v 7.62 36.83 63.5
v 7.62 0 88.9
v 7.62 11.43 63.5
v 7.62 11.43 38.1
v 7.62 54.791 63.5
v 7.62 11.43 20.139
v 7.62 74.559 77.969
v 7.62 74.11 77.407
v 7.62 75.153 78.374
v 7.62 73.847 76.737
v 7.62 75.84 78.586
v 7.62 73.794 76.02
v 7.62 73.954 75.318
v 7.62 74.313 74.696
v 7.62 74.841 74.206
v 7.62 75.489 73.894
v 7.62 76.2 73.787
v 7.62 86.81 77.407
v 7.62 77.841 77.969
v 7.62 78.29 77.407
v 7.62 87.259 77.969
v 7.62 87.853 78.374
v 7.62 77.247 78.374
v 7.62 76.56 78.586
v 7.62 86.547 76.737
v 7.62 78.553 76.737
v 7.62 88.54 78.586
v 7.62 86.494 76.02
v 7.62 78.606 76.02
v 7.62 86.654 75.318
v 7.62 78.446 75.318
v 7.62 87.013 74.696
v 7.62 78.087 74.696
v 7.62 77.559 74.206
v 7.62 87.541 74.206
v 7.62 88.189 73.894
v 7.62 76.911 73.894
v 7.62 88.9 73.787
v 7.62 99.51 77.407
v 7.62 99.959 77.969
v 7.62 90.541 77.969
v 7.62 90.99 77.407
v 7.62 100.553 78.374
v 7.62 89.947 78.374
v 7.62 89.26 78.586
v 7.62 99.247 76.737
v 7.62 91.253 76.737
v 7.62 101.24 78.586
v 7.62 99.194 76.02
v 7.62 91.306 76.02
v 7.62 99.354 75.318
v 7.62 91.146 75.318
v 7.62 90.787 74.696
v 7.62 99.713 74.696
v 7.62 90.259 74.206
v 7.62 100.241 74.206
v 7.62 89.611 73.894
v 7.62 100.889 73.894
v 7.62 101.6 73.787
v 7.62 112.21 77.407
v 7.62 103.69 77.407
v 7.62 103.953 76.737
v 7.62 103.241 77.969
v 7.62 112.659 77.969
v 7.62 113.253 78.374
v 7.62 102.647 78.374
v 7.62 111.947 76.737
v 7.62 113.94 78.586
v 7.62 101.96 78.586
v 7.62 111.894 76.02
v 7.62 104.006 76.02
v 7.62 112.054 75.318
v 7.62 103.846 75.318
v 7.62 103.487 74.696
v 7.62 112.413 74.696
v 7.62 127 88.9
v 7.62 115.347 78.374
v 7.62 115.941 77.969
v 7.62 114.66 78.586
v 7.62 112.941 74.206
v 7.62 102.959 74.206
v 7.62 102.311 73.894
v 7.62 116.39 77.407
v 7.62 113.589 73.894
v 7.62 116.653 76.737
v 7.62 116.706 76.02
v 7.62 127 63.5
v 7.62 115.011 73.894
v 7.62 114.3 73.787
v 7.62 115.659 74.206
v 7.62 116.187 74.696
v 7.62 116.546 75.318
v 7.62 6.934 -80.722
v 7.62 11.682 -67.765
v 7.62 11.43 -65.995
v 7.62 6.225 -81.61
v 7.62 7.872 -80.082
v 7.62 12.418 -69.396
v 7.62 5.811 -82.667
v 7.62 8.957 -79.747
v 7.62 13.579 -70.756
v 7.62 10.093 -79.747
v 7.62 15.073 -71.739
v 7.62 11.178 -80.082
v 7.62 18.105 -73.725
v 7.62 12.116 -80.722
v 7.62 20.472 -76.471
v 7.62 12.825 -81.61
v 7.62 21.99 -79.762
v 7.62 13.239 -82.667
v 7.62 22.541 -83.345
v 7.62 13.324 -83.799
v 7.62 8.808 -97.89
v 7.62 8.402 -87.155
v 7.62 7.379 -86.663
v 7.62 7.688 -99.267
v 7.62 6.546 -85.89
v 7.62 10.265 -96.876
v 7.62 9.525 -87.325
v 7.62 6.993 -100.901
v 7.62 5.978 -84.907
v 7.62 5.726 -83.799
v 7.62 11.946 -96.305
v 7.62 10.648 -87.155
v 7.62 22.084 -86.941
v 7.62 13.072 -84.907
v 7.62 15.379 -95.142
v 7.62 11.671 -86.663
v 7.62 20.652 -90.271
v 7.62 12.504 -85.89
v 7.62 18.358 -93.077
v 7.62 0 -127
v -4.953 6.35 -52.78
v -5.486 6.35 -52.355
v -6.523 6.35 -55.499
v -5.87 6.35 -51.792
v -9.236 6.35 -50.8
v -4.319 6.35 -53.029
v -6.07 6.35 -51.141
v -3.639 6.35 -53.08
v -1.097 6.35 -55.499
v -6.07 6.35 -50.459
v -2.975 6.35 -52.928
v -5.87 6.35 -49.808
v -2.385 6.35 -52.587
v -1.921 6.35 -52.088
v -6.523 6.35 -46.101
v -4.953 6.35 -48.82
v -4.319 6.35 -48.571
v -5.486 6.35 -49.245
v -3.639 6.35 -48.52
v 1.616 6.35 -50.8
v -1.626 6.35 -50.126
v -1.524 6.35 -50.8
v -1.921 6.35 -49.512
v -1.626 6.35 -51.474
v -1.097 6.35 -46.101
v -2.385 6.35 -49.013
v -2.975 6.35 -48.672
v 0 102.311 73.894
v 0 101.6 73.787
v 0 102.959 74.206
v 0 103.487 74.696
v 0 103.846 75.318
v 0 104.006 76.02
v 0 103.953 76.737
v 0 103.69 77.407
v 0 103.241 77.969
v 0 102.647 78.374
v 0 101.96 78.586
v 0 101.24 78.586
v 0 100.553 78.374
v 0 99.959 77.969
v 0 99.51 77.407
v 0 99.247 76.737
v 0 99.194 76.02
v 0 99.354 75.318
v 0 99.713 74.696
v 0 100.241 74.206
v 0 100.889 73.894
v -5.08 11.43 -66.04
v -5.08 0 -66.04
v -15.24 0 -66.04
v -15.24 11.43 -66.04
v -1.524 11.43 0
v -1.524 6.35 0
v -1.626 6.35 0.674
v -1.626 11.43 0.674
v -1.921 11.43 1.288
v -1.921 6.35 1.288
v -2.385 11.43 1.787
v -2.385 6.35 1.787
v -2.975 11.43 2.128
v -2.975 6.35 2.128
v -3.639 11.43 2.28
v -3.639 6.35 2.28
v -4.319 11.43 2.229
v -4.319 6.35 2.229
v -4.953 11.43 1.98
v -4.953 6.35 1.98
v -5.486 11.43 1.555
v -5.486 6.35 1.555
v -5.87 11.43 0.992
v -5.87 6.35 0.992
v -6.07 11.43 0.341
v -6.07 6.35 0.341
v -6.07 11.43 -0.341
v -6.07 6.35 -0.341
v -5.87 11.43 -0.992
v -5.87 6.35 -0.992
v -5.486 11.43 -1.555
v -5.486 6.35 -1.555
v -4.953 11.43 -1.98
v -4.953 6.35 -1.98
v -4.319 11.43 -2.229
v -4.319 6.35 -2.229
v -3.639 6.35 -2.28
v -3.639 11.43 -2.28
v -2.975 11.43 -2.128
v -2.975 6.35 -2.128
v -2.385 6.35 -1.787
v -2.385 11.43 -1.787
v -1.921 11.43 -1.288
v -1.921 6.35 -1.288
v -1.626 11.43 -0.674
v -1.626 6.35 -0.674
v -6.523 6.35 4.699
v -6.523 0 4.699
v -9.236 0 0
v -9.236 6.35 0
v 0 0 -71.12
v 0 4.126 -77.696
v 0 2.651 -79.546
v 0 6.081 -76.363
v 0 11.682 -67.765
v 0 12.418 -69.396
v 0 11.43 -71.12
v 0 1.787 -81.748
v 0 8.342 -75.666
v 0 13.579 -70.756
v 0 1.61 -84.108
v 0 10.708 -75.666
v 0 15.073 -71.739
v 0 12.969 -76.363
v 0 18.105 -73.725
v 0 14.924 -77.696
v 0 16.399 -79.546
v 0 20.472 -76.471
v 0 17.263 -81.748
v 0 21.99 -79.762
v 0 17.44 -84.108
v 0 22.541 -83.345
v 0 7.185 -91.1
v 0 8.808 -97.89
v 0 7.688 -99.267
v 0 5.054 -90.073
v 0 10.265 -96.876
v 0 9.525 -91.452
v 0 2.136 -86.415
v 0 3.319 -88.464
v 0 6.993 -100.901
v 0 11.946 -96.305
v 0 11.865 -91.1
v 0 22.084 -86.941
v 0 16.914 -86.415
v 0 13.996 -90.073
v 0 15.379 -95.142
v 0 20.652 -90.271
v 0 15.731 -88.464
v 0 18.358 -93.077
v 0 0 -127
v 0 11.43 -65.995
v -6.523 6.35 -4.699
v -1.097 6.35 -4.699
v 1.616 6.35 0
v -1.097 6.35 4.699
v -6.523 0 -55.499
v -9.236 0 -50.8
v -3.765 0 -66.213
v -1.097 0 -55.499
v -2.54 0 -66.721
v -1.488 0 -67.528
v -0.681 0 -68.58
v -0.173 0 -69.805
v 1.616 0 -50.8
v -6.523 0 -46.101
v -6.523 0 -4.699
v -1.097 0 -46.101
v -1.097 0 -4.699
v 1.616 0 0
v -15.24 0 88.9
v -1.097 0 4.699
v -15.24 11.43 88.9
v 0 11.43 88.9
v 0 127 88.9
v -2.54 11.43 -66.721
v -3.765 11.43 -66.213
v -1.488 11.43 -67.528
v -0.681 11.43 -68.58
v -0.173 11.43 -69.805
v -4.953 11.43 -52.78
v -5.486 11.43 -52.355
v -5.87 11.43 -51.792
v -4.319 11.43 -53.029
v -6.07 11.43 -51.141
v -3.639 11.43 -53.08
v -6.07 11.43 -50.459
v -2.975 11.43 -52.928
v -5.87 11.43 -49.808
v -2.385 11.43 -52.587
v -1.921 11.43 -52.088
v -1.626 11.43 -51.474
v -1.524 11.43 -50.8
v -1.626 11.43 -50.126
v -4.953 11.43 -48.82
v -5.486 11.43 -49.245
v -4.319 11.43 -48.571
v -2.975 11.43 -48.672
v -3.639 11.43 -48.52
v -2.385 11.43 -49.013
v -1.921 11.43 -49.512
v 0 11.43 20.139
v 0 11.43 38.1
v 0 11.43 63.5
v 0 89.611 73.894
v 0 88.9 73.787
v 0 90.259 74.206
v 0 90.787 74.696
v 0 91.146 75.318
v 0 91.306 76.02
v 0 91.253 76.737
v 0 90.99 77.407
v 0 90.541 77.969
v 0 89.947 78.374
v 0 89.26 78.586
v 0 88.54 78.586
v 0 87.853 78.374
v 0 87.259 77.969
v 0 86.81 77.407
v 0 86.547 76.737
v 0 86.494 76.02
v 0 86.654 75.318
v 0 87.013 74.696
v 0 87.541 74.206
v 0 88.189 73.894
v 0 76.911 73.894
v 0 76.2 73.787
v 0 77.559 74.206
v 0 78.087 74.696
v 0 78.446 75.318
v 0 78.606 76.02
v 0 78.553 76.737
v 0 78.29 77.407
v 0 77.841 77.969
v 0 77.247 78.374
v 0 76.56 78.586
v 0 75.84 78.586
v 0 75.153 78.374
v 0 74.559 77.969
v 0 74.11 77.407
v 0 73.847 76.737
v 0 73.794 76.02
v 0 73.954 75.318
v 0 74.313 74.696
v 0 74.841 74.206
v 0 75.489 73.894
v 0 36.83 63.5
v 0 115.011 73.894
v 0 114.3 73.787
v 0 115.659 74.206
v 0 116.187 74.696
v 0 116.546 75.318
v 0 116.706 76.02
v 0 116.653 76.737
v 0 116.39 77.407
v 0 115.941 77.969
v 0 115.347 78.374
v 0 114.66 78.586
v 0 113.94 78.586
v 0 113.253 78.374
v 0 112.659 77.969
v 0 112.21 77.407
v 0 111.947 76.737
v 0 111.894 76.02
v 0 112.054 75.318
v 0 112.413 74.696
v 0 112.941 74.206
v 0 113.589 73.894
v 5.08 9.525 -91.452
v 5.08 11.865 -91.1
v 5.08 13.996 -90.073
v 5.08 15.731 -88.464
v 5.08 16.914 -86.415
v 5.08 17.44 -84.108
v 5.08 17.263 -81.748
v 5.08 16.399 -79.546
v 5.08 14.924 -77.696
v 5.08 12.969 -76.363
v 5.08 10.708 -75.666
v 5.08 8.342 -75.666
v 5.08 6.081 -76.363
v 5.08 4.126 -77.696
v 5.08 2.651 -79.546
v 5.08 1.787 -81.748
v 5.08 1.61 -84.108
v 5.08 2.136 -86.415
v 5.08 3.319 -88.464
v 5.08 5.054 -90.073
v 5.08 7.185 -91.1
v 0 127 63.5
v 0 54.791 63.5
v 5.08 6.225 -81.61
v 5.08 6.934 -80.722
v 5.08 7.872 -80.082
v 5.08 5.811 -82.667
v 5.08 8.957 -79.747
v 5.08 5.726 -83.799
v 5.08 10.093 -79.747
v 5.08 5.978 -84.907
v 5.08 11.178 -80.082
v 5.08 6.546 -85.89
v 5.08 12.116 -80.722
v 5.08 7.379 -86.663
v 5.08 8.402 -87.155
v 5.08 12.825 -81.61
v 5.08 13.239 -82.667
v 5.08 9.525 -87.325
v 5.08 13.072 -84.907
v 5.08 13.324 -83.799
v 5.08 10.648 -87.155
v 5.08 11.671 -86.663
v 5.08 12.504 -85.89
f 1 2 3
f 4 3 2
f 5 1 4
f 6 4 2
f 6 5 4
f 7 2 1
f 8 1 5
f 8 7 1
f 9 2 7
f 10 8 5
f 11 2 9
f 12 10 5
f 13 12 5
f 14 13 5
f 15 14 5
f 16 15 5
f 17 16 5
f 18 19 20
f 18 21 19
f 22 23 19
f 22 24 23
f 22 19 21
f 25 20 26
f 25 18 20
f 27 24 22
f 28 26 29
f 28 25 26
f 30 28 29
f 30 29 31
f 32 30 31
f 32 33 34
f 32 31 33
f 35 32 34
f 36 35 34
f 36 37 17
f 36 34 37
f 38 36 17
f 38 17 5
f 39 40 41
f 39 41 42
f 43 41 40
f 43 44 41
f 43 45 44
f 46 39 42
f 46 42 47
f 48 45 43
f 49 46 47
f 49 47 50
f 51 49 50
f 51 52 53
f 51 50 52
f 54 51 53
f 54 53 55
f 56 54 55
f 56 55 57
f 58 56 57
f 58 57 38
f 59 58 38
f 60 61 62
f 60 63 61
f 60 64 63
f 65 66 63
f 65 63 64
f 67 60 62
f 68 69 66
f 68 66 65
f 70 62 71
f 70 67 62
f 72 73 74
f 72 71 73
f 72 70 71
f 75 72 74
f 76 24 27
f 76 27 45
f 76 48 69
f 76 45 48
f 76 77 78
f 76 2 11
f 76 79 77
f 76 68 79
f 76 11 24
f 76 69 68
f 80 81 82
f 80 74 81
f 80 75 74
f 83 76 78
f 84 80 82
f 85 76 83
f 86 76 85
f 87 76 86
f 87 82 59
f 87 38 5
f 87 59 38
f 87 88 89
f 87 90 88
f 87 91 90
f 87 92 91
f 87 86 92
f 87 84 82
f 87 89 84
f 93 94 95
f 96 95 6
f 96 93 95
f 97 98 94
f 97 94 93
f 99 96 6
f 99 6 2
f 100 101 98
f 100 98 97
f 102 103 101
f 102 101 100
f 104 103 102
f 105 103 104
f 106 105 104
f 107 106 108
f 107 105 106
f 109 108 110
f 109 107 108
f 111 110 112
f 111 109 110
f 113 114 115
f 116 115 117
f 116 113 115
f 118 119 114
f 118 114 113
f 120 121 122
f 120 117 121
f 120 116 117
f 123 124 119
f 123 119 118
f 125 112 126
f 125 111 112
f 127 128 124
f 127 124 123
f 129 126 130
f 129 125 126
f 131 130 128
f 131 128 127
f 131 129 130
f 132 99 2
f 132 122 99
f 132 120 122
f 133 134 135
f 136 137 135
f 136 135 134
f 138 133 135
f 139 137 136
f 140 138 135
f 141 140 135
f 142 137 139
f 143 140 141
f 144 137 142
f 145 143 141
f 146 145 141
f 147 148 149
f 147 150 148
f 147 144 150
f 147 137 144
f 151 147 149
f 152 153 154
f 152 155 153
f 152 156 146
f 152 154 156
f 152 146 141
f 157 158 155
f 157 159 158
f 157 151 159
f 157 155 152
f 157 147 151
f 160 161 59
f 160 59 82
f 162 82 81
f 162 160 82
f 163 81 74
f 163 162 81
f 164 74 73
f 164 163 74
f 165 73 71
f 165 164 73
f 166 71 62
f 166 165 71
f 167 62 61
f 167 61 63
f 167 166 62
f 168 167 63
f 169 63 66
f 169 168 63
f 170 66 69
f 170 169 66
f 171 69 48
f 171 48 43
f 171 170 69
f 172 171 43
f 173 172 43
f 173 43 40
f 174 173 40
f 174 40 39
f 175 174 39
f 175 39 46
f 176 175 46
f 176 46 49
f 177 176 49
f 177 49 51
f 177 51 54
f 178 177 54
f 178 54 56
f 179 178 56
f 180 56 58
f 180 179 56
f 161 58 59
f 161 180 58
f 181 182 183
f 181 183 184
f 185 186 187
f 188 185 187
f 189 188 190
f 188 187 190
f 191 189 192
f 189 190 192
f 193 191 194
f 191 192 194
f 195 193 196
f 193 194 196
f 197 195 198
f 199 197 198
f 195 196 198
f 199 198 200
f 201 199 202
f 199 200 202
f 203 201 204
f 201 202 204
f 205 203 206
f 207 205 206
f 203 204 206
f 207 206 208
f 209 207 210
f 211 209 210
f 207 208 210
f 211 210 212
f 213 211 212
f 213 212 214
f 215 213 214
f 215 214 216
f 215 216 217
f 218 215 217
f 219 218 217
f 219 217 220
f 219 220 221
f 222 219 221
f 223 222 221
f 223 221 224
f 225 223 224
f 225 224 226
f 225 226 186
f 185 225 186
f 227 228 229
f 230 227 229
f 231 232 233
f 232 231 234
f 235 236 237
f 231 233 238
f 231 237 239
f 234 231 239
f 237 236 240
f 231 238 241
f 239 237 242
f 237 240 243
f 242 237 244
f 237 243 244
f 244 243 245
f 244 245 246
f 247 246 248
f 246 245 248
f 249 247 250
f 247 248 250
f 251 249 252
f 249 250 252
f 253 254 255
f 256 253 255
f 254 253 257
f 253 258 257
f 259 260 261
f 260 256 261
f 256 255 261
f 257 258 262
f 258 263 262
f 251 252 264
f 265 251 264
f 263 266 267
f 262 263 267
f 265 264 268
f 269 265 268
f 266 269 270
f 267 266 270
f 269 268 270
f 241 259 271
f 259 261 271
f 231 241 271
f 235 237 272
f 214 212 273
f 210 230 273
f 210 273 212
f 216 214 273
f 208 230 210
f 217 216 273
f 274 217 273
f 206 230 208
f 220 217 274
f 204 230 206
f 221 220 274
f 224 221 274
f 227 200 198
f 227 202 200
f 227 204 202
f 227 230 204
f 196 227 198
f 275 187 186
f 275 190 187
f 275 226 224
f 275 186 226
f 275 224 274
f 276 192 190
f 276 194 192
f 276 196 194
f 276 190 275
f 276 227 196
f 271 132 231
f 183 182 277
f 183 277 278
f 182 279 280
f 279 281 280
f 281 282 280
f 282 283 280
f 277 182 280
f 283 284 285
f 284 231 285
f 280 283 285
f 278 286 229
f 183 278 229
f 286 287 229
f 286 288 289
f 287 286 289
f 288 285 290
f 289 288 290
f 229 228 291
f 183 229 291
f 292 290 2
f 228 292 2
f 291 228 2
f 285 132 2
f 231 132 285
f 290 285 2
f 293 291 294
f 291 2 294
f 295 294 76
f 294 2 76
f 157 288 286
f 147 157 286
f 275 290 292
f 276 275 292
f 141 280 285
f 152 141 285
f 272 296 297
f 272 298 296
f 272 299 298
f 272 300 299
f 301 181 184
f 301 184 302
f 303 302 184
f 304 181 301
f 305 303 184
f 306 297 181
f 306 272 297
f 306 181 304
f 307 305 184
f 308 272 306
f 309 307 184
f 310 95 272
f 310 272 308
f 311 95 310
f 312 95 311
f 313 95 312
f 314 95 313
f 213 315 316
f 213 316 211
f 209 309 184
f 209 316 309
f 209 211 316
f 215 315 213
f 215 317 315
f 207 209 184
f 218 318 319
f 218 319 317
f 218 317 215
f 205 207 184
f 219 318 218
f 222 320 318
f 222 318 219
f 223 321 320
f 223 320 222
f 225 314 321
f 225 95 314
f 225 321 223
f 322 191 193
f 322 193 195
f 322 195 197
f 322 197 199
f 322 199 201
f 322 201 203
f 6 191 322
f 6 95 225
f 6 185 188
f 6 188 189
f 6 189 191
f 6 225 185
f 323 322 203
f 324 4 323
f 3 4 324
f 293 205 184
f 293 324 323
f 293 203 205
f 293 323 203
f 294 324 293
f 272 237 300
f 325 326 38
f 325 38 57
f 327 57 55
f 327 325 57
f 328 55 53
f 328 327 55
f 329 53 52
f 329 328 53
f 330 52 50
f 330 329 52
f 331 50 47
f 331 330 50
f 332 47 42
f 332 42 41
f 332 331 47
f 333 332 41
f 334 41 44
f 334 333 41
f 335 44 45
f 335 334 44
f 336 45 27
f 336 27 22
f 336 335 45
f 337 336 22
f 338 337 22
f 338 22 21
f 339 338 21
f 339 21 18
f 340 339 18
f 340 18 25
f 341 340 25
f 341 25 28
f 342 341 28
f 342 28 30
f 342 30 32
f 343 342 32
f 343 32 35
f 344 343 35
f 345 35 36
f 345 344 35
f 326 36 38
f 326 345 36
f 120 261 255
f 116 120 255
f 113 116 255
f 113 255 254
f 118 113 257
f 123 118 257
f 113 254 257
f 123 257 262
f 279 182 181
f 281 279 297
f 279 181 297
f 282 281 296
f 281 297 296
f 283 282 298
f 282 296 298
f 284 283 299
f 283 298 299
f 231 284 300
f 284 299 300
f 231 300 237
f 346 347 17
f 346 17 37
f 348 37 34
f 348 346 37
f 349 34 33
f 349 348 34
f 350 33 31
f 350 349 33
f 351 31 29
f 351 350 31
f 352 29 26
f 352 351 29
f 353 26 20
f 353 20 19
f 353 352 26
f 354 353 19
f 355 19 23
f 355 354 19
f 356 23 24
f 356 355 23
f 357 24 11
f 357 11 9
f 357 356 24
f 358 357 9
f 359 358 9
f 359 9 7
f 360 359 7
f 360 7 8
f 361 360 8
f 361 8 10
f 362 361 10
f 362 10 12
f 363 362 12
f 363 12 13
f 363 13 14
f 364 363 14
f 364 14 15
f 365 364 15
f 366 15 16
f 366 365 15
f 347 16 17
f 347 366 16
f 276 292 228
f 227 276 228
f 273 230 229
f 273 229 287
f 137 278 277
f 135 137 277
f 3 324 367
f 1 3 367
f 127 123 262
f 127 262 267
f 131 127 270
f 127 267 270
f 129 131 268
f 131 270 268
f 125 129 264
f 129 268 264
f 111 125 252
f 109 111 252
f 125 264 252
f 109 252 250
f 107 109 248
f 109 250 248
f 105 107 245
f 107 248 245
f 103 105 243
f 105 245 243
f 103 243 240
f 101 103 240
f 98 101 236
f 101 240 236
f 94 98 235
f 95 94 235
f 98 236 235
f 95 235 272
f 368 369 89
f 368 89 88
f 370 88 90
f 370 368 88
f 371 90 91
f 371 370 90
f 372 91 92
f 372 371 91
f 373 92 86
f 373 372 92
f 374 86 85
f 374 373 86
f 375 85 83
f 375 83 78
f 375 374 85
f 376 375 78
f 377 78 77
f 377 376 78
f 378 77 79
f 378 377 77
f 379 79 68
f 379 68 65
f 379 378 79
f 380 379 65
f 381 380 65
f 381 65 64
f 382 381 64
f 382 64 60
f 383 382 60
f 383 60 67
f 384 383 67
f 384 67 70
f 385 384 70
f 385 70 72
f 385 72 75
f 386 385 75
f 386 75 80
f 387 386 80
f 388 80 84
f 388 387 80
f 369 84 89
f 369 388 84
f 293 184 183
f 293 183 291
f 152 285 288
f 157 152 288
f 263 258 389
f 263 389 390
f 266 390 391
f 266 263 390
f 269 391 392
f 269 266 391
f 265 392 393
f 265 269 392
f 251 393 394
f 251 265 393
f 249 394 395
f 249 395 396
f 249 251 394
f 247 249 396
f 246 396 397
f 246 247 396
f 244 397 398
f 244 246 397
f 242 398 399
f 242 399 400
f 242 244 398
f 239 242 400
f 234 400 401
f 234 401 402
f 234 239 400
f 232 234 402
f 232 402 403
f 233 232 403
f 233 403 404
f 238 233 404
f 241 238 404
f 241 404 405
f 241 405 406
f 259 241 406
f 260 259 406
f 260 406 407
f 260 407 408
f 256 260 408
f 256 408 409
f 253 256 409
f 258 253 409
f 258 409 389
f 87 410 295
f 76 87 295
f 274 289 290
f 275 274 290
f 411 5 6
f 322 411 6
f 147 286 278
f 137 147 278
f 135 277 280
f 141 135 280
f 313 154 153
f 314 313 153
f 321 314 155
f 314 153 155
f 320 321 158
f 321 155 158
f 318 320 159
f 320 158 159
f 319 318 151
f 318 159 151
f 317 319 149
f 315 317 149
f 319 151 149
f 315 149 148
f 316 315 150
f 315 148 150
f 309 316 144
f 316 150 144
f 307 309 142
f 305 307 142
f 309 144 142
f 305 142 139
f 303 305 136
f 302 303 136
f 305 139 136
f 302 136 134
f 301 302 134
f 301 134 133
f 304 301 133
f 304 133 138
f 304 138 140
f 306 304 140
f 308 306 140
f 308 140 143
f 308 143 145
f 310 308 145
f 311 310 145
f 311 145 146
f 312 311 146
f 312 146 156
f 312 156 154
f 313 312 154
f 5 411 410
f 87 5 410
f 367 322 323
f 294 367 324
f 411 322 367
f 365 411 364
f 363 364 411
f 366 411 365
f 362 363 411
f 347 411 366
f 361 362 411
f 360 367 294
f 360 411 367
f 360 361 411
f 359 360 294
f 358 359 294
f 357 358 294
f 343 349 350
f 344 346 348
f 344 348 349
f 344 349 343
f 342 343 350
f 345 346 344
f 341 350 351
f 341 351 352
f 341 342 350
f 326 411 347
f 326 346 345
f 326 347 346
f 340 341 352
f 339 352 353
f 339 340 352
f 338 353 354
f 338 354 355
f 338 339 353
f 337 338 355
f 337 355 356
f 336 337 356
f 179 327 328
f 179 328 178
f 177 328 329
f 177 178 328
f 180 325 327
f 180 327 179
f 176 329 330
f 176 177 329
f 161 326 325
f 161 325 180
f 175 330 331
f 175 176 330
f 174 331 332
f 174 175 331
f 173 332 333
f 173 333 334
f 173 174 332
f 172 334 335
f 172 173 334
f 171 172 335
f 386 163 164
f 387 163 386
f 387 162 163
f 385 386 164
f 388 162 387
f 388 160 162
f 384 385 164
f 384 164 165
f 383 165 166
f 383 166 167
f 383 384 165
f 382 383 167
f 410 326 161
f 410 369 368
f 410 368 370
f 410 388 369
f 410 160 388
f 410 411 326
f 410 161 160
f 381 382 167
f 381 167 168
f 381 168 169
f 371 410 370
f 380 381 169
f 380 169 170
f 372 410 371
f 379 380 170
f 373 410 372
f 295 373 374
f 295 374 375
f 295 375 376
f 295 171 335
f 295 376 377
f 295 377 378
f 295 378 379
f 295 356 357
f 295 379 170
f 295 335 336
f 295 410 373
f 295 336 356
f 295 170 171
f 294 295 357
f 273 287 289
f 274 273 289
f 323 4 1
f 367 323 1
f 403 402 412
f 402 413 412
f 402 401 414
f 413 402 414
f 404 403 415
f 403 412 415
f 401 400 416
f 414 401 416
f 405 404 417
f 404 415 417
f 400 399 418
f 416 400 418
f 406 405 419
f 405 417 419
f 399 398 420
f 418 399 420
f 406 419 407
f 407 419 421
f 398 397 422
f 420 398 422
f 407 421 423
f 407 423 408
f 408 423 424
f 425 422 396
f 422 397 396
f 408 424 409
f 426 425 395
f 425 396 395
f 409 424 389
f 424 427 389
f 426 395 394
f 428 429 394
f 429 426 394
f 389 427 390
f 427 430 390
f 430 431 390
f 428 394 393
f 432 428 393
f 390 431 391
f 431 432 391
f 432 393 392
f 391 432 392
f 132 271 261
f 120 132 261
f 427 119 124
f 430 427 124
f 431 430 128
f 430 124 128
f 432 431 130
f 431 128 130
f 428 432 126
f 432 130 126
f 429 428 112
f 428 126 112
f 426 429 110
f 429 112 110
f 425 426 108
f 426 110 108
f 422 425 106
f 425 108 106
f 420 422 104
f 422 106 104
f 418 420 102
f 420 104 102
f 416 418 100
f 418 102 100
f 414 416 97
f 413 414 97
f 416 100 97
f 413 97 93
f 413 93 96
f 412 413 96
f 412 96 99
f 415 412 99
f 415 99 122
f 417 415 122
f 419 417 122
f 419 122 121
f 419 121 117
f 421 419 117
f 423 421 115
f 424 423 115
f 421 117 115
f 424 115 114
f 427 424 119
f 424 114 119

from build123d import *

# Parameters (mm, degrees)
SKETCH1_R           = 7.9375
SKETCH1_R_2         = 2.413
BOSS_EXTRUDE1_DEPTH = 7.62
SKETCH2_R           = 7.9375
SKETCH2_R_2         = 3.81
BOSS_EXTRUDE2_DEPTH = 2.54
SKETCH3_W           = 154.94
SKETCH3_H           = 11.43
BOSS_EXTRUDE3_DEPTH = 15.24
FILLET1_R           = 5.08
BOSS_EXTRUDE4_DEPTH = 7.62
SKETCH5_R           = 2.286
CUT_EXTRUDE1_DEPTH  = 128
CUT_EXTRUDE2_DEPTH  = 6.35


with BuildPart() as part:
    # Sketch1 → Boss-Extrude1 (new body)
    with BuildSketch(Plane(origin=(0, 0, 0), x_dir=(0, 0, -1), z_dir=(1, 0, 0))):
        with BuildLine():
            Line((0, 0), (127, 0))
            Line((127, 0), (100.900837488, 6.993249518))
            ThreePointArc((100.900837488, 6.993249518), (97.889599245, 8.807630529), (96.305117976, 11.94593474))
            ThreePointArc((96.305117976, 11.94593474), (85.15869513, 22.438273755), (71.738889517, 15.073442623))
            ThreePointArc((71.738889517, 15.073442623), (69.395749913, 12.417671245), (65.994583888, 11.43))
            Line((65.994583888, 11.43), (0, 11.43))
            Line((0, 11.43), (-63.5, 11.43))
            Line((-63.5, 11.43), (-63.5, 127))
            Line((-63.5, 127), (-88.9, 127))
            Line((-88.9, 127), (-88.9, 0))
            Line((-88.9, 0), (0, 0))
        make_face()
        with Locations((83.514716058, 9.525)):
            Circle(SKETCH1_R, mode=Mode.SUBTRACT)
        with Locations((-76.2, 114.3)):
            Circle(SKETCH1_R_2, mode=Mode.SUBTRACT)
        with Locations((-76.2, 88.9)):
            Circle(SKETCH1_R_2, mode=Mode.SUBTRACT)
        with Locations((-76.2, 101.6)):
            Circle(SKETCH1_R_2, mode=Mode.SUBTRACT)
        with Locations((-76.2, 76.2)):
            Circle(SKETCH1_R_2, mode=Mode.SUBTRACT)
    extrude(amount=BOSS_EXTRUDE1_DEPTH)

    # Sketch2 → Boss-Extrude2 (add)
    with BuildSketch(Plane(origin=(7.62, 0, 0), x_dir=(0, 0, -1), z_dir=(1, 0, 0))):
        with Locations((83.514716058, 9.525)):
            Circle(SKETCH2_R)
        with Locations((83.514716058, 9.525)):
            Circle(SKETCH2_R_2, mode=Mode.SUBTRACT)
    extrude(amount=-BOSS_EXTRUDE2_DEPTH)

    # Sketch3 → Boss-Extrude3 (add)
    with BuildSketch(Plane.ZY):
        with Locations((11.43, 5.715)):
            Rectangle(SKETCH3_W, SKETCH3_H)
    extrude(amount=BOSS_EXTRUDE3_DEPTH)

    # Fillet1
    fillet1_edges = [part.edges().sort_by_distance(p)[0] for p in [
        (0, 5.715, -66.04),
    ]]
    fillet(fillet1_edges, radius=FILLET1_R)

    # Sketch4 → Boss-Extrude4 (add)
    with BuildSketch(Plane(origin=(7.62, 0, 0), x_dir=(0, 0, -1), z_dir=(1, 0, 0))):
        Polygon((-63.5, 54.790512242), (-20.139487758, 11.43), (-38.1, 11.43), (-63.5, 36.83), align=None)
    extrude(amount=-BOSS_EXTRUDE4_DEPTH)

    # Sketch5 → Cut-Extrude1 (cut, through all)
    with BuildSketch(Plane.XZ):
        with Locations((-3.81, -50.8)):
            Circle(SKETCH5_R)
        with Locations((-3.81, 0)):
            Circle(SKETCH5_R)
    extrude(amount=-CUT_EXTRUDE1_DEPTH, mode=Mode.SUBTRACT)

    # Sketch6 → Cut-Extrude2 (cut)
    with BuildSketch(Plane.XZ):
        Polygon((1.61593783, -50.8), (-1.097031085, -46.101), (-6.522968915, -46.101), (-9.23593783, -50.8), (-6.522968915, -55.499), (-1.097031085, -55.499), align=None)
        Polygon((-1.097031085, -4.699), (1.61593783, 0), (-1.097031085, 4.699), (-6.522968915, 4.699), (-9.23593783, 0), (-6.522968915, -4.699), align=None)
    extrude(amount=-CUT_EXTRUDE2_DEPTH, mode=Mode.SUBTRACT)


solid = part.part
